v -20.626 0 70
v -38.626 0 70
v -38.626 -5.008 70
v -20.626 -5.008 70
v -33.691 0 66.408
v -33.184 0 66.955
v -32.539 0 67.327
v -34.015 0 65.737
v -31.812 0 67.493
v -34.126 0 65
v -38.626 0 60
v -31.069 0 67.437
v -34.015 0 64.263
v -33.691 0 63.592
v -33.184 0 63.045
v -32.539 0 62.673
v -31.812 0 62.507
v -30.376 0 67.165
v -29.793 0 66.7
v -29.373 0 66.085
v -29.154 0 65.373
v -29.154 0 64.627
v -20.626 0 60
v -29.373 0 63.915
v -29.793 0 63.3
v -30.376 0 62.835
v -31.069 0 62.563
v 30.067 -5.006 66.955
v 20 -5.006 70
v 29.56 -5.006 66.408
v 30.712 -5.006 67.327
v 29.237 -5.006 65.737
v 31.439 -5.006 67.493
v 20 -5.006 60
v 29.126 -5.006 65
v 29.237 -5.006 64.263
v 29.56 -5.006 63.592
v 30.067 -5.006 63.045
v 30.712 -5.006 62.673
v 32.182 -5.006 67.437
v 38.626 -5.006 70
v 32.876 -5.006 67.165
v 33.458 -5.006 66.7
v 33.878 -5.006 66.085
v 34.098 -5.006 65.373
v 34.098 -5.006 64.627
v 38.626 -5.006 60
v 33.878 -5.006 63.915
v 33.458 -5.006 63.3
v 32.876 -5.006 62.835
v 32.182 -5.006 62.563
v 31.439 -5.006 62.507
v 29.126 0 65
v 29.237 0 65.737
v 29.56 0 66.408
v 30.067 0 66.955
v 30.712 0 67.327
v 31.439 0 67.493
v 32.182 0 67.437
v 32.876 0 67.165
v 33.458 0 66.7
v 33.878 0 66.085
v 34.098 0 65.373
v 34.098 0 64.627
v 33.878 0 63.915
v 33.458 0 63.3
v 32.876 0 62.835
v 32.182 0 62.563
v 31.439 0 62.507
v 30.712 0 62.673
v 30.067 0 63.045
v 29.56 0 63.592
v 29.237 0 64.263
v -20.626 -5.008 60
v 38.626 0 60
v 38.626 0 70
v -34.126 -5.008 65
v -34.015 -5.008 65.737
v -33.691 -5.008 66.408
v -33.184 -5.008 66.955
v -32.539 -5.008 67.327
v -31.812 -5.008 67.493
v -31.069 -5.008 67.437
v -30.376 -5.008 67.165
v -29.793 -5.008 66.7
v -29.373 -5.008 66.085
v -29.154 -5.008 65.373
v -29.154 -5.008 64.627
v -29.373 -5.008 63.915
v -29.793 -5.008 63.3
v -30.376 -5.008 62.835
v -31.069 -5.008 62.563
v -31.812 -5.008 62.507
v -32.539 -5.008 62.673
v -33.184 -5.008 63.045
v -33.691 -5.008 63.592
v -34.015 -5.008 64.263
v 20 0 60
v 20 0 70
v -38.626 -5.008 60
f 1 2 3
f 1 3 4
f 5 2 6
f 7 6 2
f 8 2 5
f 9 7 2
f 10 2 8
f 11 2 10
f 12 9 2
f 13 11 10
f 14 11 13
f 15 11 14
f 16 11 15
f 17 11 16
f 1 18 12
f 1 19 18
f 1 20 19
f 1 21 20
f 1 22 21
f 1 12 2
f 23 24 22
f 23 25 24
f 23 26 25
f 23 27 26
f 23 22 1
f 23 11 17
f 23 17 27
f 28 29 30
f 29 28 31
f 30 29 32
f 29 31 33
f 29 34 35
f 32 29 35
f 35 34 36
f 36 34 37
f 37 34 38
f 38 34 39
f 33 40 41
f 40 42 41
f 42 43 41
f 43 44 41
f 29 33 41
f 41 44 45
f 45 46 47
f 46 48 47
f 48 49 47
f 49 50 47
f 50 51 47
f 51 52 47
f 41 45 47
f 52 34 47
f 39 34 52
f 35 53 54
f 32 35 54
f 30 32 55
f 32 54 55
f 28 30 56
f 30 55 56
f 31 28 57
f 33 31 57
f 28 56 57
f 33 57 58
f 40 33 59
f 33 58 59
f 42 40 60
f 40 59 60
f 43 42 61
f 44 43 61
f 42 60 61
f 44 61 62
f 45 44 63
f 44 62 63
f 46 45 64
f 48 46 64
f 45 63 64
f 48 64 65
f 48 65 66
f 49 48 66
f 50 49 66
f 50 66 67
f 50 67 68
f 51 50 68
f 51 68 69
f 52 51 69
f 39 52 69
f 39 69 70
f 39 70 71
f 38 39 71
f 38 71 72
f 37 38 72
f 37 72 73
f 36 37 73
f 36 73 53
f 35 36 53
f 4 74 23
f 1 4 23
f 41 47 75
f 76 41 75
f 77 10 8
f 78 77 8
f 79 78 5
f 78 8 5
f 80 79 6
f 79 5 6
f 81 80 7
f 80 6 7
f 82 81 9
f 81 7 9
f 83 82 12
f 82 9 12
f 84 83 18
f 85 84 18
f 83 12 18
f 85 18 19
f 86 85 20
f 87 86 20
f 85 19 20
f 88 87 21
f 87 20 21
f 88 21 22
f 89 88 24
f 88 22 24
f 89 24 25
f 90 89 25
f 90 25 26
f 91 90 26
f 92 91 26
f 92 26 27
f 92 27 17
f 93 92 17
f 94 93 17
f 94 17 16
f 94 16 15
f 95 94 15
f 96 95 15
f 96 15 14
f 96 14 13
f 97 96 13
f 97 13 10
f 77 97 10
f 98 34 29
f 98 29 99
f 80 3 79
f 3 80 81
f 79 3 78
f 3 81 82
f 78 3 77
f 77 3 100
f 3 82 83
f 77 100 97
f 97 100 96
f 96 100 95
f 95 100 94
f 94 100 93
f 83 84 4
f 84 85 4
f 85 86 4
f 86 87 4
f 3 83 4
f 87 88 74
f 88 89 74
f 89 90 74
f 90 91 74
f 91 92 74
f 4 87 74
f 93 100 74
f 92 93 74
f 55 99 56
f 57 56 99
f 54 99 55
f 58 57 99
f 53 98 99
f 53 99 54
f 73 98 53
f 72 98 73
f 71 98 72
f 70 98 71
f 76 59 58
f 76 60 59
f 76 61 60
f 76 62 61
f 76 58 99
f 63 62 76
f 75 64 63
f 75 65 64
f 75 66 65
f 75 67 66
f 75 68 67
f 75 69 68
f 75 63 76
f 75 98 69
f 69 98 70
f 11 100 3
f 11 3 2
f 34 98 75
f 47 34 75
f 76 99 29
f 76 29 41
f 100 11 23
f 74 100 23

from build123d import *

# Parameters (mm, degrees)
SKETCH010_R      = 2.5
EXTRUDE006_DEPTH = 10
SKETCH007_W      = 18
SKETCH007_H      = 5.007978
SKETCH007_W_2    = 18.625626
SKETCH007_H_2    = 5.005528
EXTRUDE002_DEPTH = 10


with BuildPart() as extrude006:
    # Sketch010 (on Face3 of Extrude002) → Extrude006 (new body)
    with BuildSketch(Plane(origin=(0, 0, 0), x_dir=(-1, 0, 0), z_dir=(0, 1, 0))):
        with Locations((-31.625626, 65)):
            Circle(SKETCH010_R)
        with Locations((31.625626, 65)):
            Circle(SKETCH010_R)
    extrude(amount=-EXTRUDE006_DEPTH)


with BuildPart() as cut001:
    # Sketch007 (on Face1 of CopyCut) → Extrude002 (new body)
    with BuildSketch(Plane.XY.offset(60)):
        with Locations((-29.625626, -2.503989)):
            Rectangle(SKETCH007_W, SKETCH007_H)
        with Locations((29.312813, -2.502764)):
            Rectangle(SKETCH007_W_2, SKETCH007_H_2)
    extrude(amount=EXTRUDE002_DEPTH)

    # Cut001: cut Extrude006
    add(extrude006.part, mode=Mode.SUBTRACT)


solid = cut001.part
